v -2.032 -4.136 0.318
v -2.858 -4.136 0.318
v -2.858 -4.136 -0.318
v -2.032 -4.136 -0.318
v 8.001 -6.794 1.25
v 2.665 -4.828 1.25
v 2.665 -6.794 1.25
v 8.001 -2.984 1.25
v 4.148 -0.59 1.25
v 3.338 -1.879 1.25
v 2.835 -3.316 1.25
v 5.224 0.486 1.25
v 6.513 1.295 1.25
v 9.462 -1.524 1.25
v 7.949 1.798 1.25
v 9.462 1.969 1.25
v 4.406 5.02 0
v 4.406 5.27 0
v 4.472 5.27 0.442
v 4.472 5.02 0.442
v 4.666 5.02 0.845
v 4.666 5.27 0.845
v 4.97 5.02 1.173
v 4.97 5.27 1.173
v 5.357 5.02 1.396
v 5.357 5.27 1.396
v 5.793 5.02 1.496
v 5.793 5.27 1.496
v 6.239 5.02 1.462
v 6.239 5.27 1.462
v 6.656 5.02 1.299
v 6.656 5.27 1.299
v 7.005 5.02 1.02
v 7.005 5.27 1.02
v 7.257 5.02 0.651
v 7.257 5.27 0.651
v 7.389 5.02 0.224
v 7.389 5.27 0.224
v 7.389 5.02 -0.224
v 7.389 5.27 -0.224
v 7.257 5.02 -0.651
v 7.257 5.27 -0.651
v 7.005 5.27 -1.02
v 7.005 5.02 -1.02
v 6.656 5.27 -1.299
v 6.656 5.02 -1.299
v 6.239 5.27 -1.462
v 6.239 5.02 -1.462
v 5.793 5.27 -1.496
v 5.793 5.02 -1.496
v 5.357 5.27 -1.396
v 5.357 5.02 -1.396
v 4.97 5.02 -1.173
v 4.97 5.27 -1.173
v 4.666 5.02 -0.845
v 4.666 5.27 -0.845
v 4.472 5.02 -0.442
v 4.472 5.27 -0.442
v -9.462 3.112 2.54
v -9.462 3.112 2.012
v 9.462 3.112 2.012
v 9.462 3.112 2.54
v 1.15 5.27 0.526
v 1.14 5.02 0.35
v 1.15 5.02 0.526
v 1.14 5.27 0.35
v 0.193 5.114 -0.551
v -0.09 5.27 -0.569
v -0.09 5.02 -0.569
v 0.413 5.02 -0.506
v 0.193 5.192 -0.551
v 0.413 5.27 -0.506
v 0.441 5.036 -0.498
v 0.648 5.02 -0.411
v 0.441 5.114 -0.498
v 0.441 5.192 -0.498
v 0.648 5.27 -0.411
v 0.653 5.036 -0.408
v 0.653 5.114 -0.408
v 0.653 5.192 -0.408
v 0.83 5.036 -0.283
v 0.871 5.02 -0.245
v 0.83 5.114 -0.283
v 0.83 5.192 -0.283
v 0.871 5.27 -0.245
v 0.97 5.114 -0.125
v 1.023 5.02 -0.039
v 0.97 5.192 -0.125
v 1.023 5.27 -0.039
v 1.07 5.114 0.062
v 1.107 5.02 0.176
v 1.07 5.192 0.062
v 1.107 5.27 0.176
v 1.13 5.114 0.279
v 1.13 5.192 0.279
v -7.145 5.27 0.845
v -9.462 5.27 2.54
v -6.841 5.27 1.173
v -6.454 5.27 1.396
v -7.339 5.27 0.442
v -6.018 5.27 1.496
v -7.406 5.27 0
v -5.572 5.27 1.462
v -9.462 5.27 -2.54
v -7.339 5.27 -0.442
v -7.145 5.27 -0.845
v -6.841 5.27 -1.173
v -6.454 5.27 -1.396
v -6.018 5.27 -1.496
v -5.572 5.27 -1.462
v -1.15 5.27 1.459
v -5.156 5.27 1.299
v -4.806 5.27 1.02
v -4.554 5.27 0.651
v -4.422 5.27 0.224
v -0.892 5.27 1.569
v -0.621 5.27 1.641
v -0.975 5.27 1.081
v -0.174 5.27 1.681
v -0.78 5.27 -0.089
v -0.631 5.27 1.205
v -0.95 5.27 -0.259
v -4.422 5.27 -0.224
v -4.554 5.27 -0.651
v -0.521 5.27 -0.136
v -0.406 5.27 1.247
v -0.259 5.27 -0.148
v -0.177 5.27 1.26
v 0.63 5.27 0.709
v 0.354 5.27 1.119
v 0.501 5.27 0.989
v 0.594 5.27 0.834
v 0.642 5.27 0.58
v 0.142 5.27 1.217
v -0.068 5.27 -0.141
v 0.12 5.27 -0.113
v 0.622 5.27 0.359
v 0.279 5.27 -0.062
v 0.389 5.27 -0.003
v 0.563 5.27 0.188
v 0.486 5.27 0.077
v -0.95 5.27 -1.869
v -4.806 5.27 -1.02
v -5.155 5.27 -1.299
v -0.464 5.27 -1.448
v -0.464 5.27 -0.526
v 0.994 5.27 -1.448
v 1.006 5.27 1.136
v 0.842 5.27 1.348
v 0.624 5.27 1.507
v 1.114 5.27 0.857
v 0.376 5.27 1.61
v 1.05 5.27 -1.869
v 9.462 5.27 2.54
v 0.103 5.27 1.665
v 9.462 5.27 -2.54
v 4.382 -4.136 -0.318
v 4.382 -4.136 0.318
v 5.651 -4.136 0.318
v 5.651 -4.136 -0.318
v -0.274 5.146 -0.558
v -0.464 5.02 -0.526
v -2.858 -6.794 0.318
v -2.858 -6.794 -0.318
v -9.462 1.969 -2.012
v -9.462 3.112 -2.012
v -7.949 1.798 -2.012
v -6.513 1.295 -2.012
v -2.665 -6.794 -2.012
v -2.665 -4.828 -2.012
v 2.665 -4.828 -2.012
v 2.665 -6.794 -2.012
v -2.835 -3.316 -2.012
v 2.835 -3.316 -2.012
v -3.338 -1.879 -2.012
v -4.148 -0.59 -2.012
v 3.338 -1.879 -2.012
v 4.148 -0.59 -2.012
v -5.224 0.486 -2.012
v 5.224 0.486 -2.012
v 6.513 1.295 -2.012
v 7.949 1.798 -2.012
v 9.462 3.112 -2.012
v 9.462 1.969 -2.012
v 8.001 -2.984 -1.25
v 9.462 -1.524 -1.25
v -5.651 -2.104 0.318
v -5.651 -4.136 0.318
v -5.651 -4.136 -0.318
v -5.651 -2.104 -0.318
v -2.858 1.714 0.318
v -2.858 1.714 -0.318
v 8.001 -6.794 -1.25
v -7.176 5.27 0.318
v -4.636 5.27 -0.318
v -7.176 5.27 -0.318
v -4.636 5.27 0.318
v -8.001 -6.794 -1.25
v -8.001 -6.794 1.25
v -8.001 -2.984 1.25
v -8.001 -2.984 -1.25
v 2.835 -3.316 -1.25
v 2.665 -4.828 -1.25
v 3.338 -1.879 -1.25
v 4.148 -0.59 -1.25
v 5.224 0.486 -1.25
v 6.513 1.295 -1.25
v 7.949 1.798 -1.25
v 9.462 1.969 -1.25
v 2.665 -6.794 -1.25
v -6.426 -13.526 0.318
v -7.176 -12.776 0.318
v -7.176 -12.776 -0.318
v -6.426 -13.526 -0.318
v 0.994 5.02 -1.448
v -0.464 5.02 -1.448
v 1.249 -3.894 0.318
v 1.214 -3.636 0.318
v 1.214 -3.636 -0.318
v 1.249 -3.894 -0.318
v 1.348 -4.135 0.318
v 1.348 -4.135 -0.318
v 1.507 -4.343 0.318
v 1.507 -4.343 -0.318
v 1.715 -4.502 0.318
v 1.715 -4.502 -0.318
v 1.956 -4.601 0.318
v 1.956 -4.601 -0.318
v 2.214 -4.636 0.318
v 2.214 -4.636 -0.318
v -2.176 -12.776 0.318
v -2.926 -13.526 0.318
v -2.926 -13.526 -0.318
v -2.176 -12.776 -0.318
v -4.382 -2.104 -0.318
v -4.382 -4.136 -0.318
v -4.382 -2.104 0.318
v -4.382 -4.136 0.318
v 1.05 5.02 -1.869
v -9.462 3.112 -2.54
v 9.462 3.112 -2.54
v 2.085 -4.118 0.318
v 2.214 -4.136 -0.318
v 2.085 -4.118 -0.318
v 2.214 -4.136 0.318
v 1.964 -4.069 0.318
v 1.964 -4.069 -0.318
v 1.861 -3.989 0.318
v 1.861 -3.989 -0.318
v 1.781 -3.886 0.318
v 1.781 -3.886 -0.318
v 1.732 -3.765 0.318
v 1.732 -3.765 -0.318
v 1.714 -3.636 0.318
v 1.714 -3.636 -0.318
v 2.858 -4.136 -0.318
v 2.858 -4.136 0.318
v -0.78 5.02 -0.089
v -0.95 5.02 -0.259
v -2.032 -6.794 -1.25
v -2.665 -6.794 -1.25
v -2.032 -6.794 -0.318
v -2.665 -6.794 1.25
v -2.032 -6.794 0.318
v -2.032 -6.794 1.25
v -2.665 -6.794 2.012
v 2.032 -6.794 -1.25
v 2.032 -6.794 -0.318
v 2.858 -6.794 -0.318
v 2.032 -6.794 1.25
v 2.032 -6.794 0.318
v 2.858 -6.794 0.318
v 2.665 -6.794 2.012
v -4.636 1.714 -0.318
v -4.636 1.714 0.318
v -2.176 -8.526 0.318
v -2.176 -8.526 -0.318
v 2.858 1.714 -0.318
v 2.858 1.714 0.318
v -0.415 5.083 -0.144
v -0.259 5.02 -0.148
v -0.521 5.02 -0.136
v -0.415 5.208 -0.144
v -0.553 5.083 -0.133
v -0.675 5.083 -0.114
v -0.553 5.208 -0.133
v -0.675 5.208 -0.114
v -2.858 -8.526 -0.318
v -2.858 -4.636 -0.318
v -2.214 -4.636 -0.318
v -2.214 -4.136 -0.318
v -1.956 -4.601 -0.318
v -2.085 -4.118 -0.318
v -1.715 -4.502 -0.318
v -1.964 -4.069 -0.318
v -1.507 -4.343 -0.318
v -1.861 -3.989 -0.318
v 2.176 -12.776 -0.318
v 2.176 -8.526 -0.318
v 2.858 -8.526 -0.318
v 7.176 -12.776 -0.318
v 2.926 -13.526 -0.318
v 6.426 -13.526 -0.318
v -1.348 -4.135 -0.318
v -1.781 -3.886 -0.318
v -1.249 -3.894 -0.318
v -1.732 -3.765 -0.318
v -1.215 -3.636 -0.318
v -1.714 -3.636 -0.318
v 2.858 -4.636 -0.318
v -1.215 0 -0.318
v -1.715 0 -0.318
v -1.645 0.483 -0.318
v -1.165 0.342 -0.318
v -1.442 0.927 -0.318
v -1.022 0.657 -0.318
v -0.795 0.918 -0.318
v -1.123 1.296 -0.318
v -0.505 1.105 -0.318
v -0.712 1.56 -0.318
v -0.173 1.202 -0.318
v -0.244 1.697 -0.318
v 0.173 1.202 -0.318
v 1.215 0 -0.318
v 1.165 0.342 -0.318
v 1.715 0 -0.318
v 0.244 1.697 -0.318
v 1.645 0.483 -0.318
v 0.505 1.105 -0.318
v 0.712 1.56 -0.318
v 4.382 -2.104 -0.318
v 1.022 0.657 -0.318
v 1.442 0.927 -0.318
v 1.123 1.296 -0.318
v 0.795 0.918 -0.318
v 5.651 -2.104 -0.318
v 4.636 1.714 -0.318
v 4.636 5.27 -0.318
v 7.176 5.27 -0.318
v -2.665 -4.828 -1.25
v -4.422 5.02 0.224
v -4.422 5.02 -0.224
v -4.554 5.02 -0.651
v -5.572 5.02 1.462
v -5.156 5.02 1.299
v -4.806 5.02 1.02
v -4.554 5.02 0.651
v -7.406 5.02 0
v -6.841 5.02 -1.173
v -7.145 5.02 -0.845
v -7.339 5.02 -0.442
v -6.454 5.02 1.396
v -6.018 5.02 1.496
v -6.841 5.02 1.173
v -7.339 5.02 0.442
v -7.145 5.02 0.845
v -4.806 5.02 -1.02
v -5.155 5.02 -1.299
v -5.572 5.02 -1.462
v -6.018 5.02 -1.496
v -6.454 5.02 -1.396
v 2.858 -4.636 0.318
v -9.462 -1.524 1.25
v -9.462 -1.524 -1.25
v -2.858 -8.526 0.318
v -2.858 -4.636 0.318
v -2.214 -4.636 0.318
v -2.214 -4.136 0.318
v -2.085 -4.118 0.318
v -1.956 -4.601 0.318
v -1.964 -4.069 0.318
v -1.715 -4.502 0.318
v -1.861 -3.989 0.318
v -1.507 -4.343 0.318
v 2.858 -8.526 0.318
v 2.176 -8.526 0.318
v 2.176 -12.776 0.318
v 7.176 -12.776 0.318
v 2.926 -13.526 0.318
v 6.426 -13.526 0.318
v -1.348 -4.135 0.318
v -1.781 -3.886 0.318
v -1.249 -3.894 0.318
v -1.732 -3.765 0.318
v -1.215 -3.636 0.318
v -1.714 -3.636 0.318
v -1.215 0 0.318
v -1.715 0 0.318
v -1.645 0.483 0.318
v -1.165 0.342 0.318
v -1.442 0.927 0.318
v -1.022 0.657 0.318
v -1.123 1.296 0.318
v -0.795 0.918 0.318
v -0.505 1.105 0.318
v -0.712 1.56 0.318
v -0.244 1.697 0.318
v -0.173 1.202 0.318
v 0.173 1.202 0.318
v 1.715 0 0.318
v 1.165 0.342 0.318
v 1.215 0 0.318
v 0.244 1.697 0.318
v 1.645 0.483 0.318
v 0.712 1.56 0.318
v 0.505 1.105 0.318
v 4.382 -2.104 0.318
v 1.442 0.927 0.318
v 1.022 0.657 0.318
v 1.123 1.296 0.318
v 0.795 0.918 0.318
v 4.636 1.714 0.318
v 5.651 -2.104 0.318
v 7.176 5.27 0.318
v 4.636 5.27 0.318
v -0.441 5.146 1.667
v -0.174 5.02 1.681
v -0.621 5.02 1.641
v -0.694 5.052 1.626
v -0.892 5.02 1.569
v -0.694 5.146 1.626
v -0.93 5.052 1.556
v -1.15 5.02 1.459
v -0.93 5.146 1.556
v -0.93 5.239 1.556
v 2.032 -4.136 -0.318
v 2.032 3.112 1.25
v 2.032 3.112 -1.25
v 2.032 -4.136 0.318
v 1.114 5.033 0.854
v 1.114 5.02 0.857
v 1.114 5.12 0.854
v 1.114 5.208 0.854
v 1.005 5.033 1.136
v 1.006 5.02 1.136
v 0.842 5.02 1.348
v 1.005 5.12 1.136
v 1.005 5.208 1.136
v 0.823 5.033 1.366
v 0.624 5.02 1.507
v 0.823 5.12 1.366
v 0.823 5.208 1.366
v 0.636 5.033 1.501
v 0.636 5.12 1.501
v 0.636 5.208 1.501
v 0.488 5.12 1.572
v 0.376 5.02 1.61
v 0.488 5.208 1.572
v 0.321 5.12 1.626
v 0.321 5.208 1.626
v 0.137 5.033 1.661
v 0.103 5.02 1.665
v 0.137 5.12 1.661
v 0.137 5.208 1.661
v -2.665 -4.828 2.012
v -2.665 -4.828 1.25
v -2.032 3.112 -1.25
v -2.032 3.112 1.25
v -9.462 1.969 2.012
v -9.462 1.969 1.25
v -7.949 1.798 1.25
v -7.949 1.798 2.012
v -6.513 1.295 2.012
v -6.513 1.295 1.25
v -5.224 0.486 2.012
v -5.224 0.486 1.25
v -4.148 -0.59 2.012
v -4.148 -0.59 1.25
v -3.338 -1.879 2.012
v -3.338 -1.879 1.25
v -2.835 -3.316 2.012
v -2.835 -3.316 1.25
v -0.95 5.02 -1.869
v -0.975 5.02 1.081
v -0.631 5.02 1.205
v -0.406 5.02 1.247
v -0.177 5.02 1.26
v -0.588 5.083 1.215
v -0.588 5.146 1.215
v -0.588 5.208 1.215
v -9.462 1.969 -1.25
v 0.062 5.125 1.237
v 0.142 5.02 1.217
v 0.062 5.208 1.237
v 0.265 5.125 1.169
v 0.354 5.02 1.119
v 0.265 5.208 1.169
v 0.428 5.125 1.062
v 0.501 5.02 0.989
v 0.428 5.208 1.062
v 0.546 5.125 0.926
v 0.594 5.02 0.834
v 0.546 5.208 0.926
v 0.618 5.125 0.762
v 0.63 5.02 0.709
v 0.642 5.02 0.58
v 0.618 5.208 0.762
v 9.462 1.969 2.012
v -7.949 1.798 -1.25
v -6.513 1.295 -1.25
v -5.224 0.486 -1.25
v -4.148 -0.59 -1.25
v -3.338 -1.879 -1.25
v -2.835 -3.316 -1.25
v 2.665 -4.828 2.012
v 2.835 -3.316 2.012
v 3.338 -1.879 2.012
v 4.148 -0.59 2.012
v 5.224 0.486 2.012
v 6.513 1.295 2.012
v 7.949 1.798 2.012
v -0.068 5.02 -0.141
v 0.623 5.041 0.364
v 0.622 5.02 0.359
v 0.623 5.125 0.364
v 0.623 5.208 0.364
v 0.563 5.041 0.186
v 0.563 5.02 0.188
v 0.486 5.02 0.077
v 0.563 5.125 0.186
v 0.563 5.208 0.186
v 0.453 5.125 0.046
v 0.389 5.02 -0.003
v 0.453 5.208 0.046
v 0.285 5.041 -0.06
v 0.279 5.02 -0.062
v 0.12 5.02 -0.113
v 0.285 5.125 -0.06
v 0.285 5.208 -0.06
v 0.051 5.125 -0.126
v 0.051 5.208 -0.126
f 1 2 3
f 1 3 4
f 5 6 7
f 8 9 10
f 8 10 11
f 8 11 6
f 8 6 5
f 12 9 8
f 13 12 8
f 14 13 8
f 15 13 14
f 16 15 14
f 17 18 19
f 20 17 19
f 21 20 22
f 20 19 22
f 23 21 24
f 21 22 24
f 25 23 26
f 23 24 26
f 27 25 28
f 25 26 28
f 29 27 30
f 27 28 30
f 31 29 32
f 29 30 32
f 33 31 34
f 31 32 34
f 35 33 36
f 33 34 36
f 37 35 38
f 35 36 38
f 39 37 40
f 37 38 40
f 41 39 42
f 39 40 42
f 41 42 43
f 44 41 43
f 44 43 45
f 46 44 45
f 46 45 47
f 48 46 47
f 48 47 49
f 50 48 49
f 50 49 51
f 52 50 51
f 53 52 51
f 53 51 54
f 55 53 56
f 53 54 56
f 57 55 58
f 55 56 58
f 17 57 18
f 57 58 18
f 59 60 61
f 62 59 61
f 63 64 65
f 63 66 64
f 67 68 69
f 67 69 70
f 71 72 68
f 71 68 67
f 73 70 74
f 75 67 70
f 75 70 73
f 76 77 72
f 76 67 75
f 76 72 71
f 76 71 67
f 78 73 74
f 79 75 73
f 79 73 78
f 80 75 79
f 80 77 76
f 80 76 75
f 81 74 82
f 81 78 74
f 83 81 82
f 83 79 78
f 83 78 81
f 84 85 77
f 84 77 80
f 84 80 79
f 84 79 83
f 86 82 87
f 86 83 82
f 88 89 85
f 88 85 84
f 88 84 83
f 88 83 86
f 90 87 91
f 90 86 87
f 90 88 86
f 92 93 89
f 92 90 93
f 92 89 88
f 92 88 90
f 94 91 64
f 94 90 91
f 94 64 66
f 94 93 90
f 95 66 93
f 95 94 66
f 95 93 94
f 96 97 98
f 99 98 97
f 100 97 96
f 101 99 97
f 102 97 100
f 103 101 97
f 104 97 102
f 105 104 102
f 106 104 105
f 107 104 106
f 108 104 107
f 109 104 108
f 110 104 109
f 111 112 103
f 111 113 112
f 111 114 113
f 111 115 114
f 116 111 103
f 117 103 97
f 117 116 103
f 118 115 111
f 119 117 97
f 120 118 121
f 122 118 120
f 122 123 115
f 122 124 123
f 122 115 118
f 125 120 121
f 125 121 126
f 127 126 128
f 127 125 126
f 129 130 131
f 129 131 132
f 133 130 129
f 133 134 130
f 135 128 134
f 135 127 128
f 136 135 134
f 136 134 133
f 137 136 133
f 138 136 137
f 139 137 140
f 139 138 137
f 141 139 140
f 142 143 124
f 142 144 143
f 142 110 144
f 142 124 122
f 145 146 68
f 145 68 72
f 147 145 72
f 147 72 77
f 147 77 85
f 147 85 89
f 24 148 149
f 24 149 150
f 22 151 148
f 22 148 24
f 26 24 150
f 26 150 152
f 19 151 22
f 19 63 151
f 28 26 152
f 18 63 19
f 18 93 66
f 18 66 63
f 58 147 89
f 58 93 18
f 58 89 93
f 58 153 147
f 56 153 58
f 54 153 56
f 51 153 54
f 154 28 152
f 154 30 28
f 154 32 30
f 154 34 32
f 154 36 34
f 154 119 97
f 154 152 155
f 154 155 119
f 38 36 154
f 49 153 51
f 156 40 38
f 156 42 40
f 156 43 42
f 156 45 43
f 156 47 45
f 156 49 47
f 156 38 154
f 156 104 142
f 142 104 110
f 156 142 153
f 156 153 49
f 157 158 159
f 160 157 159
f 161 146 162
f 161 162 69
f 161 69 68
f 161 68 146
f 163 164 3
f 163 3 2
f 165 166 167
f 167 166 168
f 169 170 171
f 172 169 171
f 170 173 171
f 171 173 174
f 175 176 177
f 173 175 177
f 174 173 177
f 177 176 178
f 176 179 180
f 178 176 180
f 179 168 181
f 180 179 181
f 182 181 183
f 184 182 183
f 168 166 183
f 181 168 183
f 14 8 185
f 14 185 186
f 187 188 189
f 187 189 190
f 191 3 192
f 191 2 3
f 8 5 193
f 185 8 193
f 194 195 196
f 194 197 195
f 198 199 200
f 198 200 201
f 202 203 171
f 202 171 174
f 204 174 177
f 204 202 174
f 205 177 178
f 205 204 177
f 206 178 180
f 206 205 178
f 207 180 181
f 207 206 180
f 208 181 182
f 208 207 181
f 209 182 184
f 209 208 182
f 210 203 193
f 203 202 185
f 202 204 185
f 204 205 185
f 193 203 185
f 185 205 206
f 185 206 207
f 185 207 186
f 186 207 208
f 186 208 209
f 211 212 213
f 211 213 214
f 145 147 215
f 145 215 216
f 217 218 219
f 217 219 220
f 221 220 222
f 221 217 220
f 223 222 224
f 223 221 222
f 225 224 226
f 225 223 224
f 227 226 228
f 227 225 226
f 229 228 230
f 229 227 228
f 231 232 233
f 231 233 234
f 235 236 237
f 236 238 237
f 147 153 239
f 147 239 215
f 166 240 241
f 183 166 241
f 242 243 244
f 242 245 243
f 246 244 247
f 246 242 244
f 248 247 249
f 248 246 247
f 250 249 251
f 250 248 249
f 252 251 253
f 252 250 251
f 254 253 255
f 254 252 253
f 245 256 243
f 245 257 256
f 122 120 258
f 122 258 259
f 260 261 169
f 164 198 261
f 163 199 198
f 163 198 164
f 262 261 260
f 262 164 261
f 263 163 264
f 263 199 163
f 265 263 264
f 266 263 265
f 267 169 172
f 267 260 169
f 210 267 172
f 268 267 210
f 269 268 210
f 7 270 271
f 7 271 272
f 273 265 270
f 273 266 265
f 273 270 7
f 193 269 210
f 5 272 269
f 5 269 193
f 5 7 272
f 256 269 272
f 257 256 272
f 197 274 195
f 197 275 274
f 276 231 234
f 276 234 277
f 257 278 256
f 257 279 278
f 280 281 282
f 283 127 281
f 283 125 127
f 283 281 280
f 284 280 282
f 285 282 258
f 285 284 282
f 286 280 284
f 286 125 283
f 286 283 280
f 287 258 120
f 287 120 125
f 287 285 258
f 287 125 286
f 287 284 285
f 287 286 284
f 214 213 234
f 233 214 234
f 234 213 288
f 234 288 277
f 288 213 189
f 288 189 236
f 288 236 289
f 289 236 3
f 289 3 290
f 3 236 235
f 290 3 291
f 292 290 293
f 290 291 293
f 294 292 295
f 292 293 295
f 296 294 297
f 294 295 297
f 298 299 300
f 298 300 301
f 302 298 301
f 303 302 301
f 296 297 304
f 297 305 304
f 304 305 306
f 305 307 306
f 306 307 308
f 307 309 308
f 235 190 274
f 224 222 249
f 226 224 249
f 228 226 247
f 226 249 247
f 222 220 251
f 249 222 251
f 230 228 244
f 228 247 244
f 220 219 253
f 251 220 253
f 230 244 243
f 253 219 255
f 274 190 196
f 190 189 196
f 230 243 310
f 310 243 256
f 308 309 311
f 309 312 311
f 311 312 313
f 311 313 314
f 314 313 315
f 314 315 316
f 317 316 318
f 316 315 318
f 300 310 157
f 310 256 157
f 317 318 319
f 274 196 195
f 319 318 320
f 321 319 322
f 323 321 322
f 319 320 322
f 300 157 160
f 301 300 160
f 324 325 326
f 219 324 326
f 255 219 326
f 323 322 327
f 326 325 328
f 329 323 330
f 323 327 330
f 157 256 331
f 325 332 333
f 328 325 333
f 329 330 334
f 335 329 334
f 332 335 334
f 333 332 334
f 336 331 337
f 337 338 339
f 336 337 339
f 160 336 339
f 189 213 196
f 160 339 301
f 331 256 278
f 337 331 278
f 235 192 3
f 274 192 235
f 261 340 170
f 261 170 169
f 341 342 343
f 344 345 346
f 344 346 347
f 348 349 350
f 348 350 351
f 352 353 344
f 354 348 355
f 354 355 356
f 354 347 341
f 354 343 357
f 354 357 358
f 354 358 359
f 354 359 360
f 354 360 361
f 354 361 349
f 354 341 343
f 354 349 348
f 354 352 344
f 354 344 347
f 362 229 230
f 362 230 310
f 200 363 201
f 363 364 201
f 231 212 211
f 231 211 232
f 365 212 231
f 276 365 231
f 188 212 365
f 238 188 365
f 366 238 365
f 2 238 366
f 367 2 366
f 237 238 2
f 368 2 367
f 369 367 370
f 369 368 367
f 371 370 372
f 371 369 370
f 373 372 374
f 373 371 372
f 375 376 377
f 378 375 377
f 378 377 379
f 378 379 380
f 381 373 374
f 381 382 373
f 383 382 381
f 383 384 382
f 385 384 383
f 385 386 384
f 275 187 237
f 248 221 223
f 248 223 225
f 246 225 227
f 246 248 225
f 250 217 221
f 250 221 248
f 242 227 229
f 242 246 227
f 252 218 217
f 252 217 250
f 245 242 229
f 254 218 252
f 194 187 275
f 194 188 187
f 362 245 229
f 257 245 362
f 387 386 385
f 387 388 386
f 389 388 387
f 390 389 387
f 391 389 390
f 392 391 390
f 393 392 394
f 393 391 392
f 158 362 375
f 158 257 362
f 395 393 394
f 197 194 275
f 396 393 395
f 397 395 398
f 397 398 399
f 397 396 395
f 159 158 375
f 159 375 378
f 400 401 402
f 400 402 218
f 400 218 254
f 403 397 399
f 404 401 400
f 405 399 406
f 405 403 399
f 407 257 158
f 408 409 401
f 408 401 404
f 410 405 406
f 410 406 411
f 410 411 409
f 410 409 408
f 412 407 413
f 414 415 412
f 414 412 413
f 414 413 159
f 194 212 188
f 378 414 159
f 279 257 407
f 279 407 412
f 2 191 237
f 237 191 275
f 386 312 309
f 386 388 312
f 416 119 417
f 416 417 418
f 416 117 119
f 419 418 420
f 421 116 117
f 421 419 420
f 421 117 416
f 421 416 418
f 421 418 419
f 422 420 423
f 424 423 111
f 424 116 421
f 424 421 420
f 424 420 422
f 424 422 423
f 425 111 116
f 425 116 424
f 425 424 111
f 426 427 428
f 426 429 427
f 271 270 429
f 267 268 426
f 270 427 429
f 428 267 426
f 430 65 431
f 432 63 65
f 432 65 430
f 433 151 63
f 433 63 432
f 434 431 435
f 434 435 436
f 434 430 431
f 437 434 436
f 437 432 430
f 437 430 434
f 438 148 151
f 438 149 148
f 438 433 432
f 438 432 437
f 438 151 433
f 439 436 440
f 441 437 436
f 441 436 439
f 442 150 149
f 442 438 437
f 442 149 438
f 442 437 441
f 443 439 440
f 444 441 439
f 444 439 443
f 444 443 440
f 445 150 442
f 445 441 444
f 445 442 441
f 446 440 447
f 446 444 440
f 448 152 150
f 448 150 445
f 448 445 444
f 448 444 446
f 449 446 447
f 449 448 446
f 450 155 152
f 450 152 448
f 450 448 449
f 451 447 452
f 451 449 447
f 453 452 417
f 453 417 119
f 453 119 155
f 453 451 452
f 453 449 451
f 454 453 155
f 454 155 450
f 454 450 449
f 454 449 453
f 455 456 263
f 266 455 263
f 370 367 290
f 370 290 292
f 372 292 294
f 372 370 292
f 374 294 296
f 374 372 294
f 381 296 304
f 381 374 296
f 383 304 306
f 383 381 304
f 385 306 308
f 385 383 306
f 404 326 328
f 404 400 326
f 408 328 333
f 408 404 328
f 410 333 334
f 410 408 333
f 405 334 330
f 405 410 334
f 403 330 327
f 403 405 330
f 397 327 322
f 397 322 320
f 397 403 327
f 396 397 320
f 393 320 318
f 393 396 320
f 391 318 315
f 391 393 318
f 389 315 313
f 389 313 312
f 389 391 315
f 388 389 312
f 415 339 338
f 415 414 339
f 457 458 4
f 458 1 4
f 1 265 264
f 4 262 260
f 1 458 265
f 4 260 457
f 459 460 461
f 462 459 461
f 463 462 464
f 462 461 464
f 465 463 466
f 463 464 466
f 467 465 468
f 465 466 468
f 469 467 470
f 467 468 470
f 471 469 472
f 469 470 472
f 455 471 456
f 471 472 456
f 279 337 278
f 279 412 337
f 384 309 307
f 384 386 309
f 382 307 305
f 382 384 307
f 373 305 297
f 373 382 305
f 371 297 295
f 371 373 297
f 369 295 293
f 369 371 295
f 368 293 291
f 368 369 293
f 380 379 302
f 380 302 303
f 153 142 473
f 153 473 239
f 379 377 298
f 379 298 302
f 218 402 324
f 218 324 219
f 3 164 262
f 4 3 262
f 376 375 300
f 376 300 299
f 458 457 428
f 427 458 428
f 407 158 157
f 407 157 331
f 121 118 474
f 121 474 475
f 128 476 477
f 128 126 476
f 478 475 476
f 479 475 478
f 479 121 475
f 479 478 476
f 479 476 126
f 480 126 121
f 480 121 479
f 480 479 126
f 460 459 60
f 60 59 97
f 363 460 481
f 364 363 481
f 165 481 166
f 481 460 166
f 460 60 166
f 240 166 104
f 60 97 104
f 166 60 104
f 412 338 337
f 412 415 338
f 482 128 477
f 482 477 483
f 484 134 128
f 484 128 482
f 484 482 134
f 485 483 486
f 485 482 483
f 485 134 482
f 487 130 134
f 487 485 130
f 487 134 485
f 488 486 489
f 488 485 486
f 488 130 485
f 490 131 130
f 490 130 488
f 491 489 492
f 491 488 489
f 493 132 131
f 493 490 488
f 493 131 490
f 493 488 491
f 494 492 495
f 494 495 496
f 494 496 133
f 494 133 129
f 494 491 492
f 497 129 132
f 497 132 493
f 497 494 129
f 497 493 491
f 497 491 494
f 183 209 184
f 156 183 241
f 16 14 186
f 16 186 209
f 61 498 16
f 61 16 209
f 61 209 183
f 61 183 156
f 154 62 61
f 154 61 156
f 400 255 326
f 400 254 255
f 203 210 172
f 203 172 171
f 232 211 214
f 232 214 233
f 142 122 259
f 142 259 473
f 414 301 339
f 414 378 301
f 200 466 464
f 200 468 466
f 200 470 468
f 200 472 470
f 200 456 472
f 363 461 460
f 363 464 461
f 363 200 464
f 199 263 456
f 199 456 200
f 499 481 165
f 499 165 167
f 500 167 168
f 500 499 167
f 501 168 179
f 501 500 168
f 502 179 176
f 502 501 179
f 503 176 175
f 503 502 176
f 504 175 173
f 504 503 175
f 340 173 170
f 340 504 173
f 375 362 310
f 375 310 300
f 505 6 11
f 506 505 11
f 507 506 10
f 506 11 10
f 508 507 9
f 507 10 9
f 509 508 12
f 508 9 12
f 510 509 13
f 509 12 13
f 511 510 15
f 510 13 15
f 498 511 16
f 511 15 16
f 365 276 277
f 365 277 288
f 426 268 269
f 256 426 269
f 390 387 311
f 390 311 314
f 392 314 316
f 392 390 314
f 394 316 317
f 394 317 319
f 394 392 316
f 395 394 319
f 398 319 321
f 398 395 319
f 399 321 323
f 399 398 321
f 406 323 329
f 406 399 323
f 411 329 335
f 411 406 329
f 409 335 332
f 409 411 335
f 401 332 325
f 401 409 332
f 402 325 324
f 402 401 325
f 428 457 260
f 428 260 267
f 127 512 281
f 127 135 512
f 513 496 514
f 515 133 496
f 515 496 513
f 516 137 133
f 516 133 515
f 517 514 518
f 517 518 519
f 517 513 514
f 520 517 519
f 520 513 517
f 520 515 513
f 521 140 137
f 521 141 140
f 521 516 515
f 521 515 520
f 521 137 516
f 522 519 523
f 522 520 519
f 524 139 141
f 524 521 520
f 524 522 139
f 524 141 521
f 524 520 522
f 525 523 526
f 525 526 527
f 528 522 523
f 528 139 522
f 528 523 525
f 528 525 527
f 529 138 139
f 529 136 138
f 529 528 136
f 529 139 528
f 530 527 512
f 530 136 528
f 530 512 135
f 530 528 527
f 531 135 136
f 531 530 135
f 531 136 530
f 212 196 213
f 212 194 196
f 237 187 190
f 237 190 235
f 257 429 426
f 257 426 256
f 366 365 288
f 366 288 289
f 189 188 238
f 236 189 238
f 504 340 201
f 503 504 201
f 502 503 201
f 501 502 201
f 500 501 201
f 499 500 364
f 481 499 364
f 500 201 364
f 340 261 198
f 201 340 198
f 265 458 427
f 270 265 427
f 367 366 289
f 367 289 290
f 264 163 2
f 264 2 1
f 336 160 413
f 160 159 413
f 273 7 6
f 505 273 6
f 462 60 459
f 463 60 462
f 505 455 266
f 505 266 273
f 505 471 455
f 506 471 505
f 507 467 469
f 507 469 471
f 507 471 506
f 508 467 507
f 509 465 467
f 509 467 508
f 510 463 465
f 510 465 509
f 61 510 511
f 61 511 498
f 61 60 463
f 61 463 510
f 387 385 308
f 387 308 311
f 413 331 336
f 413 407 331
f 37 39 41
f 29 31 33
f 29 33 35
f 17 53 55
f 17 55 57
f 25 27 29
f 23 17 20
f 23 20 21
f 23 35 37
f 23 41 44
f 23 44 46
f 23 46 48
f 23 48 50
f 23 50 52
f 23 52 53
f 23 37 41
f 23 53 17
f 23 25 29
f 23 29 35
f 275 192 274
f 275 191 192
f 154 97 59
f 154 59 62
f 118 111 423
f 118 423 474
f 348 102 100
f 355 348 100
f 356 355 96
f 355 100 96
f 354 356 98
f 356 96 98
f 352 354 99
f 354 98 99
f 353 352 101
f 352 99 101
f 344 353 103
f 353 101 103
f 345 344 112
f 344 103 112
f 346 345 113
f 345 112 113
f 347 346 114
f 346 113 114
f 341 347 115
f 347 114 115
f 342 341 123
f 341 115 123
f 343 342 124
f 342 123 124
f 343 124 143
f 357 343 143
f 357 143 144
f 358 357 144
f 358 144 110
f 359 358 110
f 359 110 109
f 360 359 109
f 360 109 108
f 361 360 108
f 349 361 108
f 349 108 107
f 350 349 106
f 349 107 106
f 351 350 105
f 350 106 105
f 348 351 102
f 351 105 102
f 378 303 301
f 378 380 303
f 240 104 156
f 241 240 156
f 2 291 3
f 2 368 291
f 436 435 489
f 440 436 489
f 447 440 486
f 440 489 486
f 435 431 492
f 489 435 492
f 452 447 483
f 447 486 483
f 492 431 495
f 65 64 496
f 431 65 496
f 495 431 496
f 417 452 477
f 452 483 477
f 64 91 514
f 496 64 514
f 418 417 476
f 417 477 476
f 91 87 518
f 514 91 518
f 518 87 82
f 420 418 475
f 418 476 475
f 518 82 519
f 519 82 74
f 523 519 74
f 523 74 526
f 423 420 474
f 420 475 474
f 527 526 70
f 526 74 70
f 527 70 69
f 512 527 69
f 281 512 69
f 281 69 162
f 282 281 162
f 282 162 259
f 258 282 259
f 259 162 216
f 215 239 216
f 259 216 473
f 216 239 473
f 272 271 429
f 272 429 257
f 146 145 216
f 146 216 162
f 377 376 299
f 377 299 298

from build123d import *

# Parameters (mm, degrees)
SKETCH3_W             = 1.27
SKETCH3_H             = 2.032
BOSS_EXTRUDE2_DEPTH   = 0.3175
SKETCH4_W             = 5.969
SKETCH4_H             = 2.5
BOSS_EXTRUDE3_DEPTH   = 10.16
BOSS_EXTRUDE3_2_DEPTH = 10.16
BOSS_EXTRUDE4_DEPTH   = 0.762
SKETCH7_W             = 18.923
SKETCH7_H             = 5.08
BOSS_EXTRUDE5_DEPTH   = 2.159
SKETCH9_R             = 1.5
CUT_EXTRUDE1_DEPTH    = 0.25
BOSS_EXTRUDE6_DEPTH   = 1.25
SKETCH11_W            = 5.715
SKETCH11_H            = 0.635
CUT_EXTRUDE2_DEPTH    = 2.659


with BuildPart() as part:
    # Sketch3 → Boss-Extrude2 (new, symmetric)
    with BuildSketch(Plane.XY):
        with BuildLine():
            Line((-7.1755, 5.2705), (-7.1755, -12.7755))
            Line((-7.1755, -12.7755), (-6.4255, -13.5255))
            Line((-6.4255, -13.5255), (-2.9255, -13.5255))
            Line((-2.9255, -13.5255), (-2.1755, -12.7755))
            Line((-2.1755, -12.7755), (-2.1755, -8.5255))
            Line((-2.1755, -8.5255), (-2.8575, -8.5255))
            Line((-2.8575, -8.5255), (-2.8575, -4.6355))
            Line((-2.8575, -4.6355), (-2.2145, -4.6355))
            ThreePointArc((-2.2145, -4.6355), (-1.507393219, -4.342606781), (-1.2145, -3.6355))
            Line((-1.2145, -3.6355), (-1.2145, 0))
            ThreePointArc((-1.2145, 0), (0, 1.2145), (1.2145, 0))
            Line((1.2145, 0), (1.2145, -3.6355))
            ThreePointArc((1.2145, -3.6355), (1.507393219, -4.342606781), (2.2145, -4.6355))
            Line((2.2145, -4.6355), (2.8575, -4.6355))
            Line((2.8575, -4.6355), (2.8575, -8.5255))
            Line((2.8575, -8.5255), (2.1755, -8.5255))
            Line((2.1755, -8.5255), (2.1755, -12.7755))
            Line((2.1755, -12.7755), (2.9255, -13.5255))
            Line((2.9255, -13.5255), (6.4255, -13.5255))
            Line((6.4255, -13.5255), (7.1755, -12.7755))
            Line((7.1755, -12.7755), (7.1755, 5.2705))
            Line((7.1755, 5.2705), (4.6355, 5.2705))
            Line((4.6355, 5.2705), (4.6355, 1.7145))
            Line((4.6355, 1.7145), (2.8575, 1.7145))
            Line((2.8575, 1.7145), (2.8575, -4.1355))
            Line((2.8575, -4.1355), (2.2145, -4.1355))
            ThreePointArc((2.2145, -4.1355), (1.860946609, -3.989053391), (1.7145, -3.6355))
            Line((1.7145, -3.6355), (1.7145, 0))
            ThreePointArc((1.7145, 0), (0, 1.7145), (-1.7145, 0))
            Line((-1.7145, 0), (-1.7145, -3.6355))
            ThreePointArc((-1.7145, -3.6355), (-1.860946609, -3.989053391), (-2.2145, -4.1355))
            Line((-2.2145, -4.1355), (-2.8575, -4.1355))
            Line((-2.8575, -4.1355), (-2.8575, 1.7145))
            Line((-2.8575, 1.7145), (-4.6355, 1.7145))
            Line((-4.6355, 1.7145), (-4.6355, 5.2705))
            Line((-4.6355, 5.2705), (-7.1755, 5.2705))
        make_face()
        with Locations((-5.0165, -3.1195)):
            Rectangle(SKETCH3_W, SKETCH3_H, mode=Mode.SUBTRACT)
        with Locations((5.0165, -3.1195)):
            Rectangle(SKETCH3_W, SKETCH3_H, mode=Mode.SUBTRACT)
    extrude(amount=BOSS_EXTRUDE2_DEPTH, both=True)


with BuildPart() as body_2:
    # Sketch4 → Boss-Extrude3 (new body)
    with BuildSketch(Plane(origin=(0, -6.7945, 0), x_dir=(-1, 0, 0), z_dir=(0, -1, 0))):
        with Locations((5.0165, 0)):
            Rectangle(SKETCH4_W, SKETCH4_H)
    extrude(amount=-BOSS_EXTRUDE3_DEPTH)



with BuildPart() as body_3:
    # Sketch4 → Boss-Extrude3 2 (new body)
    with BuildSketch(Plane(origin=(0, -6.7945, 0), x_dir=(-1, 0, 0), z_dir=(0, -1, 0))):
        with Locations((-5.0165, 0)):
            Rectangle(SKETCH4_W, SKETCH4_H)
    extrude(amount=-BOSS_EXTRUDE3_2_DEPTH)


with BuildPart() as body_2_1:
    add(body_2.part)

    add(body_3.part)  # Boss-Extrude4 merges body 3
    # Sketch6 → Boss-Extrude4 (add)
    with BuildSketch(Plane.XY.offset(1.25)):
        with BuildLine():
            Line((-2.665, -6.7945), (2.665, -6.7945))
            Line((2.665, -6.7945), (2.665, -4.828))
            ThreePointArc((2.665, -4.828), (4.655648762, -0.022148762), (9.4615, 1.9685))
            Line((9.4615, 1.9685), (9.4615, 5.2705))
            Line((9.4615, 5.2705), (-9.4615, 5.2705))
            Line((-9.4615, 5.2705), (-9.4615, 1.9685))
            ThreePointArc((-9.4615, 1.9685), (-4.655648762, -0.022148762), (-2.665, -4.828))
            Line((-2.665, -4.828), (-2.665, -6.7945))
        make_face()
    boss_extrude4 = extrude(amount=BOSS_EXTRUDE4_DEPTH)

    # Mirror1: Boss-Extrude4 across plane
    add(boss_extrude4.mirror(Plane.XY))

    # Sketch7 → Boss-Extrude5 (add)
    with BuildSketch(Plane(origin=(0, 5.2705, 0), x_dir=(1, 0, 0), z_dir=(0, 1, 0))):
        Rectangle(SKETCH7_W, SKETCH7_H)
    extrude(amount=-BOSS_EXTRUDE5_DEPTH)

    # Sketch9 → Cut-Extrude1 (cut)
    with BuildSketch(Plane(origin=(0, 5.2705, 0), x_dir=(1, 0, 0), z_dir=(0, 1, 0))):
        with Locations(Location((5.9055, 0, 0), (0, 0, 180))):
            Circle(SKETCH9_R)
        with Locations(Location((-5.9055, 0, 0), (0, 0, 180))):
            Circle(SKETCH9_R)
        with BuildLine():
            add(Edge.make_bspline(
                [(-0.08984375, 0.569), (-0.041112326, 0.568108111), (0.053414477, 0.566378069), (0.190723499, 0.552814929), (0.319377928, 0.531456245), (0.439472081, 0.500279339), (0.550699522, 0.459762304), (0.653038741, 0.410273503), (0.746924888, 0.352369167), (0.831303213, 0.284895181), (0.906920064, 0.2097577), (0.972030118, 0.126419749), (1.027080852, 0.035589247), (1.072732156, -0.062206793), (1.106895811, -0.16811613), (1.131527898, -0.280883518), (1.147954726, -0.401094174), (1.149305744, -0.483807908), (1.15, -0.5263125)],
                knots=[0, 0, 0, 0, 1.242083543, 2.409332159, 3.513840015, 4.563706157, 5.567627895, 6.526667597, 7.456968273, 8.373499391, 9.274804841, 10.168572785, 11.062340729, 11.977163179, 12.91348467, 13.892783447, 14.917152251, 16, 16, 16, 16], degree=3))
            add(Edge.make_bspline(
                [(1.15, -0.5263125), (1.148152893, -0.582923429), (1.144556453, -0.693148717), (1.117996809, -0.852947479), (1.072567825, -1.001160546), (1.019404848, -1.115248113), (0.968052148, -1.199737013), (0.924198198, -1.258684227), (0.876281091, -1.314942165), (0.823130962, -1.366793678), (0.7658788, -1.415961746), (0.702915837, -1.460138408), (0.635829398, -1.501785367), (0.563665011, -1.539157356), (0.487103454, -1.573020782), (0.405646825, -1.601381334), (0.3203851, -1.627046594), (0.230092594, -1.645967217), (0.135473508, -1.661563595), (0.036208375, -1.67363778), (-0.067638046, -1.679421606), (-0.138275893, -1.680467709), (-0.17421875, -1.681)],
                knots=[0, 0, 0, 0, 1.699567221, 3.309171754, 4.847737104, 6.341571698, 7.075209316, 7.81345883, 8.545469153, 9.291997436, 10.040979259, 10.809148184, 11.599139078, 12.410628951, 13.247532119, 14.110765742, 14.999137177, 15.919460584, 16.878538601, 17.878602103, 18.920563088, 20, 20, 20, 20], degree=3))
            add(Edge.make_bspline(
                [(-0.17421875, -1.681), (-0.219558645, -1.68057344), (-0.308815127, -1.67973371), (-0.440704841, -1.667883367), (-0.568843838, -1.651222543), (-0.693064547, -1.62703803), (-0.813336116, -1.595631054), (-0.929328981, -1.557284417), (-1.042251827, -1.51310255), (-1.11405573, -1.47713165), (-1.15, -1.459125)],
                knots=[0, 0, 0, 0, 1.07657564, 2.119355445, 3.142877715, 4.14490383, 5.123106261, 6.09331634, 7.045534418, 8, 8, 8, 8], degree=3))
            Line((-1.15, -1.459125), (-0.975, -1.081))
            add(Edge.make_bspline(
                [(-0.975, -1.081), (-0.91174514, -1.108522329), (-0.786072006, -1.163202988), (-0.587924377, -1.218900249), (-0.384593202, -1.253941113), (-0.246758984, -1.257908313), (-0.17734375, -1.25990625)],
                knots=[0, 0, 0, 0, 1.003632589, 1.993991511, 2.989746143, 4, 4, 4, 4], degree=3))
            add(Edge.make_bspline(
                [(-0.17734375, -1.25990625), (-0.135864948, -1.259024709), (-0.055648257, -1.25731988), (0.060047463, -1.239445634), (0.167164964, -1.21215425), (0.264332538, -1.171585644), (0.352324323, -1.123102192), (0.428159993, -1.064444524), (0.49480543, -1.000288864), (0.547575983, -0.926657097), (0.590566098, -0.84764168), (0.619803667, -0.762543287), (0.638697544, -0.672973017), (0.641008001, -0.61156687), (0.6421875, -0.58021875)],
                knots=[0, 0, 0, 0, 1.248636637, 2.414763568, 3.51849477, 4.570401148, 5.578565807, 6.535744226, 7.451111541, 8.35497541, 9.25351194, 10.15174016, 11.056454852, 12, 12, 12, 12], degree=3))
            add(Edge.make_bspline(
                [(0.6421875, -0.58021875), (0.641434932, -0.542404319), (0.639990797, -0.469840673), (0.624965164, -0.36577922), (0.60038123, -0.271400564), (0.565143495, -0.186237388), (0.51735571, -0.109484037), (0.453835804, -0.042812869), (0.375615671, 0.014693197), (0.282902013, 0.063642259), (0.173078392, 0.101624572), (0.045715757, 0.129348413), (-0.100385952, 0.145157315), (-0.203866603, 0.14695534), (-0.25859375, 0.14790625)],
                knots=[0, 0, 0, 0, 1.017137661, 1.951826756, 2.822266574, 3.63582456, 4.423334301, 5.241438264, 6.097911455, 7.025955007, 8.052323392, 9.215437194, 10.527346152, 12, 12, 12, 12], degree=3))
            add(Edge.make_bspline(
                [(-0.25859375, 0.14790625), (-0.310702302, 0.147191661), (-0.409056504, 0.145842883), (-0.548138527, 0.135026811), (-0.670420562, 0.117577348), (-0.744930117, 0.097770699), (-0.7796875, 0.08853125)],
                knots=[0, 0, 0, 0, 1.188276599, 2.242856334, 3.180323729, 4, 4, 4, 4], degree=3))
            Line((-0.7796875, 0.08853125), (-0.95, 0.25884375))
            Line((-0.95, 0.25884375), (-0.95, 1.869))
            Line((-0.95, 1.869), (1.05, 1.869))
            Line((1.05, 1.869), (0.99375, 1.44790625))
            Line((0.99375, 1.44790625), (-0.4640625, 1.44790625))
            Line((-0.4640625, 1.44790625), (-0.4640625, 0.52603125))
            add(Edge.make_bspline(
                [(-0.4640625, 0.52603125), (-0.400980755, 0.538463192), (-0.277382081, 0.56282161), (-0.151485695, 0.566969226), (-0.08984375, 0.569)],
                knots=[0, 0, 0, 0, 1.020751159, 2, 2, 2, 2], degree=3))
        make_face()
    extrude(amount=-CUT_EXTRUDE1_DEPTH, mode=Mode.SUBTRACT)

    # Sketch10 → Boss-Extrude6 (add, symmetric)
    with BuildSketch(Plane.XY):
        Polygon((-9.4615, 3.1115), (-9.4615, -1.524), (-8.001, -2.9845), (-8.001, 3.1115), align=None)
        Polygon((8.001, 3.1115), (8.001, -2.9845), (9.4615, -1.524), (9.4615, 3.1115), align=None)
    extrude(amount=BOSS_EXTRUDE6_DEPTH, both=True)

    # Sketch11 → Cut-Extrude2 (cut)
    with BuildSketch(Plane.XZ.offset(6.7945)):
        Rectangle(SKETCH11_W, SKETCH11_H)
    extrude(amount=-CUT_EXTRUDE2_DEPTH, mode=Mode.SUBTRACT)


solid = Compound([part.part, body_2_1.part])
